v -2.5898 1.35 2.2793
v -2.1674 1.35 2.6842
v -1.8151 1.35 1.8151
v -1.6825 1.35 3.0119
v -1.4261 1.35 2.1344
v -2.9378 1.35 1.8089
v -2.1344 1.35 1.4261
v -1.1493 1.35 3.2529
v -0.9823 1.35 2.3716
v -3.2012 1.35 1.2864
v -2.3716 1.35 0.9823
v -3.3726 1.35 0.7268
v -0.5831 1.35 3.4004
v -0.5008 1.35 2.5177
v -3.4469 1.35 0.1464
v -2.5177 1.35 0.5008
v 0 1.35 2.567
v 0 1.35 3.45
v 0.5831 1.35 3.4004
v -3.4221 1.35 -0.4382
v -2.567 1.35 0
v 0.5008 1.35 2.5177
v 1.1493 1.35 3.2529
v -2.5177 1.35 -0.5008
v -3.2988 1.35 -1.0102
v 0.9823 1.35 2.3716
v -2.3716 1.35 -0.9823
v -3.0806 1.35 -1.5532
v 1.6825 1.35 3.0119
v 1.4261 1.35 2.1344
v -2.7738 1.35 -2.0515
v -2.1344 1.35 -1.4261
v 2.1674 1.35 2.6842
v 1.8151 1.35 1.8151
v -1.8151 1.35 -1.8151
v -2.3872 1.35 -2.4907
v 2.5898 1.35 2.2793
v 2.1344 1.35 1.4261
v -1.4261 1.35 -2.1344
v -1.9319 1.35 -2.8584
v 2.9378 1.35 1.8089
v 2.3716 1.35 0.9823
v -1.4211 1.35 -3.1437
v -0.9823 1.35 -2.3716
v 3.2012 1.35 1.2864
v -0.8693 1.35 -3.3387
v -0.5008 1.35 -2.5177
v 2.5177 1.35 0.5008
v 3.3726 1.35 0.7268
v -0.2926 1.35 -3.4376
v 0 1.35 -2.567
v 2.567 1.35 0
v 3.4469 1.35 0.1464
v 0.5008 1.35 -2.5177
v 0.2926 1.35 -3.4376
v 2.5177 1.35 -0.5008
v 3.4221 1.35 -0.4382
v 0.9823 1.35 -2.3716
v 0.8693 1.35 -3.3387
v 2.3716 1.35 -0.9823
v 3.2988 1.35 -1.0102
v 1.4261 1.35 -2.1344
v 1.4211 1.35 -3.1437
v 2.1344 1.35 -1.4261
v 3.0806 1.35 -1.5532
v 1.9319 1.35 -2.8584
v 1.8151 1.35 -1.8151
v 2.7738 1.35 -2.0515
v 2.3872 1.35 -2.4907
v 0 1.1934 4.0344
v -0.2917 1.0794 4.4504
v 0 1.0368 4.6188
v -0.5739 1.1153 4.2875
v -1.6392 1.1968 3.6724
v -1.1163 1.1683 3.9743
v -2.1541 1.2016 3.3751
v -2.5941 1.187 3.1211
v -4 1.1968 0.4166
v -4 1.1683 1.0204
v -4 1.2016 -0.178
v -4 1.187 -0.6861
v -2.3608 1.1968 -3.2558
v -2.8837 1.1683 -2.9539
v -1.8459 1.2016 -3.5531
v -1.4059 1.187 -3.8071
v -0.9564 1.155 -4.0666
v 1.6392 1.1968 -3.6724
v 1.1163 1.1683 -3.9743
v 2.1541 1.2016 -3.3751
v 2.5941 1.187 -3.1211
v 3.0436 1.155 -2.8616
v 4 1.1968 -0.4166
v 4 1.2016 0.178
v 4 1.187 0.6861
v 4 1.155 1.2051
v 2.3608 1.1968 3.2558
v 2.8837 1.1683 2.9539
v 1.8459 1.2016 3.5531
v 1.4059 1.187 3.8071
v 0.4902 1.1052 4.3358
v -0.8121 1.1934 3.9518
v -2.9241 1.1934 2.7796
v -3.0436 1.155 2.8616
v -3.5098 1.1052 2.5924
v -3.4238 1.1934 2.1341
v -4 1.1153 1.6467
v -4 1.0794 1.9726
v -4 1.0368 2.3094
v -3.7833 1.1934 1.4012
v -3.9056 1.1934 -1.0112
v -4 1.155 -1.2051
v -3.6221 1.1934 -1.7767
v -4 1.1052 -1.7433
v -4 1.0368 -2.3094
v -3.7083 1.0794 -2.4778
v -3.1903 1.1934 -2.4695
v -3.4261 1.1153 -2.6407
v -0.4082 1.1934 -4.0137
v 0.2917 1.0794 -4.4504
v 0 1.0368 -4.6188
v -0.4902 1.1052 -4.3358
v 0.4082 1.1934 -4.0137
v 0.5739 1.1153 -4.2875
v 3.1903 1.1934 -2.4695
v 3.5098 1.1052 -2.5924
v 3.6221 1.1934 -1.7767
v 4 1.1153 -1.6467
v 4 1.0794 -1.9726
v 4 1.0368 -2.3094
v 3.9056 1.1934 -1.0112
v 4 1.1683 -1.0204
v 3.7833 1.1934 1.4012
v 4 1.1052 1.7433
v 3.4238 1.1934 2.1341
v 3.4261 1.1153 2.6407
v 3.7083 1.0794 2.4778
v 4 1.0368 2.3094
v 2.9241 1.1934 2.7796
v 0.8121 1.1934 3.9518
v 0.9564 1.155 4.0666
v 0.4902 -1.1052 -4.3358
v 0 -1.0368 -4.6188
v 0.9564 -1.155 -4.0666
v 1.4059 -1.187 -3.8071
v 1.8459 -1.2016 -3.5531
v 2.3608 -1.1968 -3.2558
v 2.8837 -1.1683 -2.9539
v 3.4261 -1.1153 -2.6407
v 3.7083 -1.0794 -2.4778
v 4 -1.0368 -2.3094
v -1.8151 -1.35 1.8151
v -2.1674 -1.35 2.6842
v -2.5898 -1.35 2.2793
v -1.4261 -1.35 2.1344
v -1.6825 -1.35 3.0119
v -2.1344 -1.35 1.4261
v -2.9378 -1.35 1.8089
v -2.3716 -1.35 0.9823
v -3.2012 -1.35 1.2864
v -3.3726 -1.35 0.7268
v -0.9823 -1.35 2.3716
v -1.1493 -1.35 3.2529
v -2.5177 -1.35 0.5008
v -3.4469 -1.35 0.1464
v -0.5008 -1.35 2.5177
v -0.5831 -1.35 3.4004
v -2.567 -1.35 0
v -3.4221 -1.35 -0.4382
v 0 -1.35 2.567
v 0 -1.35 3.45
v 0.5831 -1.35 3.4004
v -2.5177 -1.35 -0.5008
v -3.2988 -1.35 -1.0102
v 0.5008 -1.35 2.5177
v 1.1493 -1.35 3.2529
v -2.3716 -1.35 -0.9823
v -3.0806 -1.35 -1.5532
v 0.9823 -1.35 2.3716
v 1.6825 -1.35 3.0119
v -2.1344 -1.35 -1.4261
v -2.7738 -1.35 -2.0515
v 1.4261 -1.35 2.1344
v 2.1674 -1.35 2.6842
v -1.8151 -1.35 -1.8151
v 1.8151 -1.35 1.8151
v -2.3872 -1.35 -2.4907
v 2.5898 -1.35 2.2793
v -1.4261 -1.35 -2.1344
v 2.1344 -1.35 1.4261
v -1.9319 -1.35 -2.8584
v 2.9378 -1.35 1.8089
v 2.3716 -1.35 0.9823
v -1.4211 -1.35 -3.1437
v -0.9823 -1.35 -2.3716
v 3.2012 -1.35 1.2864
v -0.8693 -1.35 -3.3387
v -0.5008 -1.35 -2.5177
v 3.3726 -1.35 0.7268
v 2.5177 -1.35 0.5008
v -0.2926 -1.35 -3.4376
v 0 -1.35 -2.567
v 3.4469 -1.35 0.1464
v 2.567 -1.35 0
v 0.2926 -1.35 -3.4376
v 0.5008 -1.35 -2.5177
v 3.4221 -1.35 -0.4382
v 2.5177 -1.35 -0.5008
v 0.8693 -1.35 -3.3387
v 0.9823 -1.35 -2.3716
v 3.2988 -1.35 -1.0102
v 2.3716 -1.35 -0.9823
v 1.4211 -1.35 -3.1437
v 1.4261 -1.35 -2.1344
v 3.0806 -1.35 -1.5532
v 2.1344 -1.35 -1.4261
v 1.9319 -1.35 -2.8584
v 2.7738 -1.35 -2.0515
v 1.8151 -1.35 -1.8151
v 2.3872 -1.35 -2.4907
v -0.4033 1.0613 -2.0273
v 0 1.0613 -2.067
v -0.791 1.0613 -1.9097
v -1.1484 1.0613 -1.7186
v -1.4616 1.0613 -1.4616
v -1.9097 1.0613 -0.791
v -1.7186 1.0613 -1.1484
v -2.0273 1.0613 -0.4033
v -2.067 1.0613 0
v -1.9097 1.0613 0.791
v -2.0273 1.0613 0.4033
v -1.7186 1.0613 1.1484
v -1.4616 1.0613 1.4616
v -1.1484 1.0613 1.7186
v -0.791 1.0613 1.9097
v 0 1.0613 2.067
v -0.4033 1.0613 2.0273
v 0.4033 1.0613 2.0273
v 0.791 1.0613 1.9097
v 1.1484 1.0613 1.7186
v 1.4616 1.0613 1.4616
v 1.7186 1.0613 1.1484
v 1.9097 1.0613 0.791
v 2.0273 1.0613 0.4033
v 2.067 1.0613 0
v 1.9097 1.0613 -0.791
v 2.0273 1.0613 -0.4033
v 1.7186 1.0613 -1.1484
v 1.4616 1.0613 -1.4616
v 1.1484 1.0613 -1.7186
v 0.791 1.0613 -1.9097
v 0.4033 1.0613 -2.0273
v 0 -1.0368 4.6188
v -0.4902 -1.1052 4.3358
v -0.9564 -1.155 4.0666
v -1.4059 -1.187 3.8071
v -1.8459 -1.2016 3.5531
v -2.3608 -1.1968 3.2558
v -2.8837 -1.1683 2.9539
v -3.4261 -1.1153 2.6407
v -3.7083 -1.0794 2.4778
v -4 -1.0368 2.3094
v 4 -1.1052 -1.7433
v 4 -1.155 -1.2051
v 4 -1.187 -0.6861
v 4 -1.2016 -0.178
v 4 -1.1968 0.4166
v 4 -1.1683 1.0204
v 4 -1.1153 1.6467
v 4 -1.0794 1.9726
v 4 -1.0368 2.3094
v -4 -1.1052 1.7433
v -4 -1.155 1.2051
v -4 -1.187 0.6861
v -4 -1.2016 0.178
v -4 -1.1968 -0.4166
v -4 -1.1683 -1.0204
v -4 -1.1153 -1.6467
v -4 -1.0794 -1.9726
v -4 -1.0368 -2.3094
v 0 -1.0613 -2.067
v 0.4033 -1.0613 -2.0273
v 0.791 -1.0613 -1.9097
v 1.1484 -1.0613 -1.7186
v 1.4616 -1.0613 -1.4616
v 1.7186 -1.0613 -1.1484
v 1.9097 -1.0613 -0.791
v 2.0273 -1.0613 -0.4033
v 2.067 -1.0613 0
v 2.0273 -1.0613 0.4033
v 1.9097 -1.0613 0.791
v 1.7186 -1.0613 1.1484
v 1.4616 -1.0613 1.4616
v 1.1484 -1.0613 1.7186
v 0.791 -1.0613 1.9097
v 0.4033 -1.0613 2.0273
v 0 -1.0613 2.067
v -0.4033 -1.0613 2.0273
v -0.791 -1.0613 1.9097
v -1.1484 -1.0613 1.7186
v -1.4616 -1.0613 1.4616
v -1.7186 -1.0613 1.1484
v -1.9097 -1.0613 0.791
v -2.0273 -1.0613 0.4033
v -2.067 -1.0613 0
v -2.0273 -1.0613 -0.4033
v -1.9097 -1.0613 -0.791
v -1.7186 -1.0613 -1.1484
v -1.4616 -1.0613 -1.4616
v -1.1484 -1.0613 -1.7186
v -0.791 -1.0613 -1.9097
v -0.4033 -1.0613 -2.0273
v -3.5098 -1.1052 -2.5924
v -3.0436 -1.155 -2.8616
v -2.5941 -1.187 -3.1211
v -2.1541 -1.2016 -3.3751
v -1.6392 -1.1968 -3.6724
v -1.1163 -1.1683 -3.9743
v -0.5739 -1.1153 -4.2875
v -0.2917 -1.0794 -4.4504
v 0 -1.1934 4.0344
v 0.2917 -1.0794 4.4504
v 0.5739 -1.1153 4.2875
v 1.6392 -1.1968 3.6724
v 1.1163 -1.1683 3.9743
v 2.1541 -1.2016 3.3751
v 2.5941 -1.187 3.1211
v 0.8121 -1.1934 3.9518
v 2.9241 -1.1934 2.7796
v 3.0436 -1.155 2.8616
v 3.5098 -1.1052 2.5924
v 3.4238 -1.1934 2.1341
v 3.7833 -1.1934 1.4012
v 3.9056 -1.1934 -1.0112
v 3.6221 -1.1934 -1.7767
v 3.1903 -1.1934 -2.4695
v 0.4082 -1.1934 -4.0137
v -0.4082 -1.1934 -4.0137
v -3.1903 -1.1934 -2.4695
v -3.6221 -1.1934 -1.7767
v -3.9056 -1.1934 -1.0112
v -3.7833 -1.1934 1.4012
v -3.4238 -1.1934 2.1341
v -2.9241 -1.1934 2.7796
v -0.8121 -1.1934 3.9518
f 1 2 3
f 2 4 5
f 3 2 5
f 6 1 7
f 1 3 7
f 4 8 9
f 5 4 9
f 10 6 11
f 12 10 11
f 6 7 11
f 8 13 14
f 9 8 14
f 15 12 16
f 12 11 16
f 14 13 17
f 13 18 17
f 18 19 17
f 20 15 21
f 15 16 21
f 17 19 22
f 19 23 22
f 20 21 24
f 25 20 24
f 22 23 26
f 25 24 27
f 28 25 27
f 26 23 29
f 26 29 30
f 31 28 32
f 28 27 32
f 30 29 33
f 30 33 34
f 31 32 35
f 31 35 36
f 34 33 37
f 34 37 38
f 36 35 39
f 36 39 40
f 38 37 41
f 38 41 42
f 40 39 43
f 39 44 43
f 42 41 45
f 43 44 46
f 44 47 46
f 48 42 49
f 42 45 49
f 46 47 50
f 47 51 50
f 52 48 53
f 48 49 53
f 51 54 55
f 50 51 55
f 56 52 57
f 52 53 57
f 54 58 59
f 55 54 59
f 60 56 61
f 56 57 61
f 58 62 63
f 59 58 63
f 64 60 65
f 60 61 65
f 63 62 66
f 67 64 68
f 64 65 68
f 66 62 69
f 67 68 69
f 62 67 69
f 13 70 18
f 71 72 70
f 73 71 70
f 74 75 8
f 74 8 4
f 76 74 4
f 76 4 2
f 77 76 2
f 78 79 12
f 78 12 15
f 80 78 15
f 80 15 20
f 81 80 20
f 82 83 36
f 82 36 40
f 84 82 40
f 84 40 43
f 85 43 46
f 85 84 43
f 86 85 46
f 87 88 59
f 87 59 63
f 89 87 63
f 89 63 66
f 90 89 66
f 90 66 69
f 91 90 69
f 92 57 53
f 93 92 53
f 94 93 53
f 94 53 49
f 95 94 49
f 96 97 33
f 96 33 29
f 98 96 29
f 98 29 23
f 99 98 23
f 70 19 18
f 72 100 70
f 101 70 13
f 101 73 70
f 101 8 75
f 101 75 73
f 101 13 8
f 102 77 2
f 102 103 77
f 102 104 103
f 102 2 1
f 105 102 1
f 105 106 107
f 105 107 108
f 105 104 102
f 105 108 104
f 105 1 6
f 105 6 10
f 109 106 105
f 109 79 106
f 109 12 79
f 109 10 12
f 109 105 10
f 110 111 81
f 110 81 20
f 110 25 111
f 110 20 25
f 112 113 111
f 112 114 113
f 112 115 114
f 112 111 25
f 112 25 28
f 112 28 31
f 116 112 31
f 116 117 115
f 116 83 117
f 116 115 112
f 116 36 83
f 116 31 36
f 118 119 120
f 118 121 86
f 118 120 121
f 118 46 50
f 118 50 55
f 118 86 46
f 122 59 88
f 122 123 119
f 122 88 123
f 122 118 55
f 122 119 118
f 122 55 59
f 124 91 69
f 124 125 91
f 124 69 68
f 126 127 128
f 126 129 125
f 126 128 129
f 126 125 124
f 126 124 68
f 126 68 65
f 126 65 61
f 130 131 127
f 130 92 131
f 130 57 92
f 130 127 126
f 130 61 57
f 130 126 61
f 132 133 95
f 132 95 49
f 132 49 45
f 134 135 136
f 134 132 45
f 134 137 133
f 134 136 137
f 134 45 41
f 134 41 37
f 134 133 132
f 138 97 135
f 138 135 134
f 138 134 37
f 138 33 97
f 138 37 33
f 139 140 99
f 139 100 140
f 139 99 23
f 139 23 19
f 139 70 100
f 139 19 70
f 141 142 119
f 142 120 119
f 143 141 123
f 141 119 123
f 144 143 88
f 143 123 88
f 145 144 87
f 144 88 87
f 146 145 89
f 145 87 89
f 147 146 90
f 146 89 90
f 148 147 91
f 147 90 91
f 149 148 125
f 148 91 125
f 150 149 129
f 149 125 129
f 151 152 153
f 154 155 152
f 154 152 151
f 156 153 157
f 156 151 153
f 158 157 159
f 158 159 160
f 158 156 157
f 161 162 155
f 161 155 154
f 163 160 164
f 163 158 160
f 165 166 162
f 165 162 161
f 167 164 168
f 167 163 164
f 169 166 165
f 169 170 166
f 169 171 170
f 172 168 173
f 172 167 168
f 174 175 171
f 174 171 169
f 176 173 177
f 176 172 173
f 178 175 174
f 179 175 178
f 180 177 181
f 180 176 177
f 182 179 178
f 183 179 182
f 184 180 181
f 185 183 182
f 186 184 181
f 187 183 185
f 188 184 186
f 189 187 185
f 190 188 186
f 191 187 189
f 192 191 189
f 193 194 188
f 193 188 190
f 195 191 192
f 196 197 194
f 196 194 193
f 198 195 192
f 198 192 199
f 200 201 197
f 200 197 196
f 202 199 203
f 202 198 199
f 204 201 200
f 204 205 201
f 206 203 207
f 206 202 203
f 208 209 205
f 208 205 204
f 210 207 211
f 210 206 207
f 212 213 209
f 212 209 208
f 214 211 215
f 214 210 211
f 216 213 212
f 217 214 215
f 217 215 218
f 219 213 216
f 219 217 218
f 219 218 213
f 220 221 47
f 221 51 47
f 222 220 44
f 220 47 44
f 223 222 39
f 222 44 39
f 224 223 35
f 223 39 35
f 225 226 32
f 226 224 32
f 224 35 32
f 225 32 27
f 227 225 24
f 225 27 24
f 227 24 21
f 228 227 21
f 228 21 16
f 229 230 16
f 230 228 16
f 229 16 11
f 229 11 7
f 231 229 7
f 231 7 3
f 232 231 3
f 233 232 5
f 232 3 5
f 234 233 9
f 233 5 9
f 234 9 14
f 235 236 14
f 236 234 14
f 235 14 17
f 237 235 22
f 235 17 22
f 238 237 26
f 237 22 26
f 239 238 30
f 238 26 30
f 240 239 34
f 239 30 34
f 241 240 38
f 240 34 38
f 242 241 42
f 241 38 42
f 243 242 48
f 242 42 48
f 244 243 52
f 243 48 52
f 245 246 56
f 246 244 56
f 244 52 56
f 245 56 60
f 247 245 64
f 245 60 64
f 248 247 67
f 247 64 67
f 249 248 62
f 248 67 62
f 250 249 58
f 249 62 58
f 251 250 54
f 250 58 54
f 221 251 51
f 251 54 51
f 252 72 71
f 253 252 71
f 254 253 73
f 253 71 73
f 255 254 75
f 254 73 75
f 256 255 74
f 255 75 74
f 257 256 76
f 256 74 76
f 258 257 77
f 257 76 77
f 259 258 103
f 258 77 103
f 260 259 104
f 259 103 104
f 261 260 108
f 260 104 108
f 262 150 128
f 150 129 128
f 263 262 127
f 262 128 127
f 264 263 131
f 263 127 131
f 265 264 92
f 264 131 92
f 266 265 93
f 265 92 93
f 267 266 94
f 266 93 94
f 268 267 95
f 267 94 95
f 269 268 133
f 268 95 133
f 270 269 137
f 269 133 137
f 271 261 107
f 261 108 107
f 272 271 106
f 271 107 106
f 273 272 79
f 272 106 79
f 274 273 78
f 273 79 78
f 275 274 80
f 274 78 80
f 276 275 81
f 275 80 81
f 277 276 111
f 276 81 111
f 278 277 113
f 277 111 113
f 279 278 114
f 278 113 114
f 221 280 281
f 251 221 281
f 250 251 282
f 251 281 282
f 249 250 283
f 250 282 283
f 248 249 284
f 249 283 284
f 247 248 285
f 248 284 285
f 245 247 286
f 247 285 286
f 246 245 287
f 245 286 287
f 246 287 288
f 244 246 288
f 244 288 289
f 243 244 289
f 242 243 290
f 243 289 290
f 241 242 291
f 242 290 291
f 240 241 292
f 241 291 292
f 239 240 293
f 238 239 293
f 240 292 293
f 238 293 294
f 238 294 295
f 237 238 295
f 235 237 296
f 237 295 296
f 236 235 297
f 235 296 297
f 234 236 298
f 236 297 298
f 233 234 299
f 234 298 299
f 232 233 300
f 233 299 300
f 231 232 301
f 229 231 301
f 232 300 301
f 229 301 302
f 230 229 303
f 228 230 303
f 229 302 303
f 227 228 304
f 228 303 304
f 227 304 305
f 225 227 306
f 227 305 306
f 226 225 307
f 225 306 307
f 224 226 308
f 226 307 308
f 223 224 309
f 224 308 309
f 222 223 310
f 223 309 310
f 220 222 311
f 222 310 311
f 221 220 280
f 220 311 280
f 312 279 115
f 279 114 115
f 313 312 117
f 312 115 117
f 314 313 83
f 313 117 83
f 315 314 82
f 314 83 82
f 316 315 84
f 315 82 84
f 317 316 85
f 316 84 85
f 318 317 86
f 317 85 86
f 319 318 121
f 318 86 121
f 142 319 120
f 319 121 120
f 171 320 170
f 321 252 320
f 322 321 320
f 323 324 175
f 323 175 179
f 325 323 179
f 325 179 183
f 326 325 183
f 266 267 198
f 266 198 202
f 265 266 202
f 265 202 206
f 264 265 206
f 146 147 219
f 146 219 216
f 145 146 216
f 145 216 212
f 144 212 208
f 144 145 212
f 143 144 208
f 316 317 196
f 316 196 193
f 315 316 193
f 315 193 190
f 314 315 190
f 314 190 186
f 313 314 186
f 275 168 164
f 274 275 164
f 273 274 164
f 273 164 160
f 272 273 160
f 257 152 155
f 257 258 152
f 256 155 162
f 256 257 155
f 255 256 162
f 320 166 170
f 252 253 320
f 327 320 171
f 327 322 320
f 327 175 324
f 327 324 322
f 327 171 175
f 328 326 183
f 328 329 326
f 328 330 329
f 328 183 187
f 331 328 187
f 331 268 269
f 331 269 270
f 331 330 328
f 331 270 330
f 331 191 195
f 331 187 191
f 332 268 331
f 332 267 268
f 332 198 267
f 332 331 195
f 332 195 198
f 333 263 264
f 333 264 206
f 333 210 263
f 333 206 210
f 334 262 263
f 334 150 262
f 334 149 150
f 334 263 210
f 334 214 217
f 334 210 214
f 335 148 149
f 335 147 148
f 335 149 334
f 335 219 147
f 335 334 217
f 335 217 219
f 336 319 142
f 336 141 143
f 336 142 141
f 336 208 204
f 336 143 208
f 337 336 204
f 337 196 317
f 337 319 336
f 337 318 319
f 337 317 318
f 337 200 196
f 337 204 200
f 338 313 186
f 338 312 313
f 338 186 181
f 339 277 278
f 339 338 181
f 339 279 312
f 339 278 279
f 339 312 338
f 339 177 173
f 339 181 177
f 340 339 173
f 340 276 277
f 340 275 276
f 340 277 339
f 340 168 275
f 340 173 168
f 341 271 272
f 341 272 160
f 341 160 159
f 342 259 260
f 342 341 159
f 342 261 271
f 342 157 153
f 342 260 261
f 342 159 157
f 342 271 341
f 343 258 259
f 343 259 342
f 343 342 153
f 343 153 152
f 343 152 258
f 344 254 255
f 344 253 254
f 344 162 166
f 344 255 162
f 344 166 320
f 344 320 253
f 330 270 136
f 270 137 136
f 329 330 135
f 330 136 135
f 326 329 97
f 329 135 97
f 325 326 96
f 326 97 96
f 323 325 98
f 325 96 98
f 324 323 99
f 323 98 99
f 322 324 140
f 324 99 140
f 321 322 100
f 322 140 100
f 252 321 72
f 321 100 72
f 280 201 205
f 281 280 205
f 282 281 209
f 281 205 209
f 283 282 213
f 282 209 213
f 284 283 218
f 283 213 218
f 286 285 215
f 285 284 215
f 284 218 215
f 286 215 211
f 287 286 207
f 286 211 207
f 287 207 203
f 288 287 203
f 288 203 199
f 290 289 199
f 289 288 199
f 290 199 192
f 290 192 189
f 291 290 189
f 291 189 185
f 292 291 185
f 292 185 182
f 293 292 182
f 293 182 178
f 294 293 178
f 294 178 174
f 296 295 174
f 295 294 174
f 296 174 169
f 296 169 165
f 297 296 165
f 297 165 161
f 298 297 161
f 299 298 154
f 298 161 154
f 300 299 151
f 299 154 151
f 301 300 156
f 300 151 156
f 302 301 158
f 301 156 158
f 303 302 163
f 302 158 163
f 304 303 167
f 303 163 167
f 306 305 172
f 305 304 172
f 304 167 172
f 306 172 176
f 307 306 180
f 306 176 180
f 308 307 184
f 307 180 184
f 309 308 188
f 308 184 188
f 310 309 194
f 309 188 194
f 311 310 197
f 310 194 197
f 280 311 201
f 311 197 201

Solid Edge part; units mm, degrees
sketch "Sketch1" plane through (0, 0, 0) normal (0, -1, 0) x (1, 0, 0)
  line L0 (4, 2.3094) -> (0, 4.6188)
  line L1 (0, 4.6188) -> (-4, 2.3094)
  line L2 (-4, 2.3094) -> (-4, -2.3094)
  line L3 (-4, -2.3094) -> (0, -4.6188)
  line L4 (0, -4.6188) -> (4, -2.3094)
  line L5 (4, -2.3094) -> (4, 2.3094)
extrude "Protrusion1" add sketch "Sketch1" along normal mid plane 2.7
sketch "Sketch2" plane through (0, 0, 0) normal (1, 0, 0) x (0, 1, 0)
  line L0 (-1.35, 3.45) -> (-1.0368, 4.6188)
revolve "RevolvedCutout1" cut sketch "Sketch2" angle 360 about axis through (0, 0, 0) along (0, -1, 0) material side at (0, -1.2417, 4.0473)
mirror "Mirror1" about plane through (0, 0, 0) normal (0, -1, 0) of "RevolvedCutout1"
hole "孔_7" at (0, -1.35, 0) direction (0, 1, 0) diameter 4.134 end up to next start chamfer 0.5 start chamfer angle 60 end chamfer 0.5 end chamfer angle 60
